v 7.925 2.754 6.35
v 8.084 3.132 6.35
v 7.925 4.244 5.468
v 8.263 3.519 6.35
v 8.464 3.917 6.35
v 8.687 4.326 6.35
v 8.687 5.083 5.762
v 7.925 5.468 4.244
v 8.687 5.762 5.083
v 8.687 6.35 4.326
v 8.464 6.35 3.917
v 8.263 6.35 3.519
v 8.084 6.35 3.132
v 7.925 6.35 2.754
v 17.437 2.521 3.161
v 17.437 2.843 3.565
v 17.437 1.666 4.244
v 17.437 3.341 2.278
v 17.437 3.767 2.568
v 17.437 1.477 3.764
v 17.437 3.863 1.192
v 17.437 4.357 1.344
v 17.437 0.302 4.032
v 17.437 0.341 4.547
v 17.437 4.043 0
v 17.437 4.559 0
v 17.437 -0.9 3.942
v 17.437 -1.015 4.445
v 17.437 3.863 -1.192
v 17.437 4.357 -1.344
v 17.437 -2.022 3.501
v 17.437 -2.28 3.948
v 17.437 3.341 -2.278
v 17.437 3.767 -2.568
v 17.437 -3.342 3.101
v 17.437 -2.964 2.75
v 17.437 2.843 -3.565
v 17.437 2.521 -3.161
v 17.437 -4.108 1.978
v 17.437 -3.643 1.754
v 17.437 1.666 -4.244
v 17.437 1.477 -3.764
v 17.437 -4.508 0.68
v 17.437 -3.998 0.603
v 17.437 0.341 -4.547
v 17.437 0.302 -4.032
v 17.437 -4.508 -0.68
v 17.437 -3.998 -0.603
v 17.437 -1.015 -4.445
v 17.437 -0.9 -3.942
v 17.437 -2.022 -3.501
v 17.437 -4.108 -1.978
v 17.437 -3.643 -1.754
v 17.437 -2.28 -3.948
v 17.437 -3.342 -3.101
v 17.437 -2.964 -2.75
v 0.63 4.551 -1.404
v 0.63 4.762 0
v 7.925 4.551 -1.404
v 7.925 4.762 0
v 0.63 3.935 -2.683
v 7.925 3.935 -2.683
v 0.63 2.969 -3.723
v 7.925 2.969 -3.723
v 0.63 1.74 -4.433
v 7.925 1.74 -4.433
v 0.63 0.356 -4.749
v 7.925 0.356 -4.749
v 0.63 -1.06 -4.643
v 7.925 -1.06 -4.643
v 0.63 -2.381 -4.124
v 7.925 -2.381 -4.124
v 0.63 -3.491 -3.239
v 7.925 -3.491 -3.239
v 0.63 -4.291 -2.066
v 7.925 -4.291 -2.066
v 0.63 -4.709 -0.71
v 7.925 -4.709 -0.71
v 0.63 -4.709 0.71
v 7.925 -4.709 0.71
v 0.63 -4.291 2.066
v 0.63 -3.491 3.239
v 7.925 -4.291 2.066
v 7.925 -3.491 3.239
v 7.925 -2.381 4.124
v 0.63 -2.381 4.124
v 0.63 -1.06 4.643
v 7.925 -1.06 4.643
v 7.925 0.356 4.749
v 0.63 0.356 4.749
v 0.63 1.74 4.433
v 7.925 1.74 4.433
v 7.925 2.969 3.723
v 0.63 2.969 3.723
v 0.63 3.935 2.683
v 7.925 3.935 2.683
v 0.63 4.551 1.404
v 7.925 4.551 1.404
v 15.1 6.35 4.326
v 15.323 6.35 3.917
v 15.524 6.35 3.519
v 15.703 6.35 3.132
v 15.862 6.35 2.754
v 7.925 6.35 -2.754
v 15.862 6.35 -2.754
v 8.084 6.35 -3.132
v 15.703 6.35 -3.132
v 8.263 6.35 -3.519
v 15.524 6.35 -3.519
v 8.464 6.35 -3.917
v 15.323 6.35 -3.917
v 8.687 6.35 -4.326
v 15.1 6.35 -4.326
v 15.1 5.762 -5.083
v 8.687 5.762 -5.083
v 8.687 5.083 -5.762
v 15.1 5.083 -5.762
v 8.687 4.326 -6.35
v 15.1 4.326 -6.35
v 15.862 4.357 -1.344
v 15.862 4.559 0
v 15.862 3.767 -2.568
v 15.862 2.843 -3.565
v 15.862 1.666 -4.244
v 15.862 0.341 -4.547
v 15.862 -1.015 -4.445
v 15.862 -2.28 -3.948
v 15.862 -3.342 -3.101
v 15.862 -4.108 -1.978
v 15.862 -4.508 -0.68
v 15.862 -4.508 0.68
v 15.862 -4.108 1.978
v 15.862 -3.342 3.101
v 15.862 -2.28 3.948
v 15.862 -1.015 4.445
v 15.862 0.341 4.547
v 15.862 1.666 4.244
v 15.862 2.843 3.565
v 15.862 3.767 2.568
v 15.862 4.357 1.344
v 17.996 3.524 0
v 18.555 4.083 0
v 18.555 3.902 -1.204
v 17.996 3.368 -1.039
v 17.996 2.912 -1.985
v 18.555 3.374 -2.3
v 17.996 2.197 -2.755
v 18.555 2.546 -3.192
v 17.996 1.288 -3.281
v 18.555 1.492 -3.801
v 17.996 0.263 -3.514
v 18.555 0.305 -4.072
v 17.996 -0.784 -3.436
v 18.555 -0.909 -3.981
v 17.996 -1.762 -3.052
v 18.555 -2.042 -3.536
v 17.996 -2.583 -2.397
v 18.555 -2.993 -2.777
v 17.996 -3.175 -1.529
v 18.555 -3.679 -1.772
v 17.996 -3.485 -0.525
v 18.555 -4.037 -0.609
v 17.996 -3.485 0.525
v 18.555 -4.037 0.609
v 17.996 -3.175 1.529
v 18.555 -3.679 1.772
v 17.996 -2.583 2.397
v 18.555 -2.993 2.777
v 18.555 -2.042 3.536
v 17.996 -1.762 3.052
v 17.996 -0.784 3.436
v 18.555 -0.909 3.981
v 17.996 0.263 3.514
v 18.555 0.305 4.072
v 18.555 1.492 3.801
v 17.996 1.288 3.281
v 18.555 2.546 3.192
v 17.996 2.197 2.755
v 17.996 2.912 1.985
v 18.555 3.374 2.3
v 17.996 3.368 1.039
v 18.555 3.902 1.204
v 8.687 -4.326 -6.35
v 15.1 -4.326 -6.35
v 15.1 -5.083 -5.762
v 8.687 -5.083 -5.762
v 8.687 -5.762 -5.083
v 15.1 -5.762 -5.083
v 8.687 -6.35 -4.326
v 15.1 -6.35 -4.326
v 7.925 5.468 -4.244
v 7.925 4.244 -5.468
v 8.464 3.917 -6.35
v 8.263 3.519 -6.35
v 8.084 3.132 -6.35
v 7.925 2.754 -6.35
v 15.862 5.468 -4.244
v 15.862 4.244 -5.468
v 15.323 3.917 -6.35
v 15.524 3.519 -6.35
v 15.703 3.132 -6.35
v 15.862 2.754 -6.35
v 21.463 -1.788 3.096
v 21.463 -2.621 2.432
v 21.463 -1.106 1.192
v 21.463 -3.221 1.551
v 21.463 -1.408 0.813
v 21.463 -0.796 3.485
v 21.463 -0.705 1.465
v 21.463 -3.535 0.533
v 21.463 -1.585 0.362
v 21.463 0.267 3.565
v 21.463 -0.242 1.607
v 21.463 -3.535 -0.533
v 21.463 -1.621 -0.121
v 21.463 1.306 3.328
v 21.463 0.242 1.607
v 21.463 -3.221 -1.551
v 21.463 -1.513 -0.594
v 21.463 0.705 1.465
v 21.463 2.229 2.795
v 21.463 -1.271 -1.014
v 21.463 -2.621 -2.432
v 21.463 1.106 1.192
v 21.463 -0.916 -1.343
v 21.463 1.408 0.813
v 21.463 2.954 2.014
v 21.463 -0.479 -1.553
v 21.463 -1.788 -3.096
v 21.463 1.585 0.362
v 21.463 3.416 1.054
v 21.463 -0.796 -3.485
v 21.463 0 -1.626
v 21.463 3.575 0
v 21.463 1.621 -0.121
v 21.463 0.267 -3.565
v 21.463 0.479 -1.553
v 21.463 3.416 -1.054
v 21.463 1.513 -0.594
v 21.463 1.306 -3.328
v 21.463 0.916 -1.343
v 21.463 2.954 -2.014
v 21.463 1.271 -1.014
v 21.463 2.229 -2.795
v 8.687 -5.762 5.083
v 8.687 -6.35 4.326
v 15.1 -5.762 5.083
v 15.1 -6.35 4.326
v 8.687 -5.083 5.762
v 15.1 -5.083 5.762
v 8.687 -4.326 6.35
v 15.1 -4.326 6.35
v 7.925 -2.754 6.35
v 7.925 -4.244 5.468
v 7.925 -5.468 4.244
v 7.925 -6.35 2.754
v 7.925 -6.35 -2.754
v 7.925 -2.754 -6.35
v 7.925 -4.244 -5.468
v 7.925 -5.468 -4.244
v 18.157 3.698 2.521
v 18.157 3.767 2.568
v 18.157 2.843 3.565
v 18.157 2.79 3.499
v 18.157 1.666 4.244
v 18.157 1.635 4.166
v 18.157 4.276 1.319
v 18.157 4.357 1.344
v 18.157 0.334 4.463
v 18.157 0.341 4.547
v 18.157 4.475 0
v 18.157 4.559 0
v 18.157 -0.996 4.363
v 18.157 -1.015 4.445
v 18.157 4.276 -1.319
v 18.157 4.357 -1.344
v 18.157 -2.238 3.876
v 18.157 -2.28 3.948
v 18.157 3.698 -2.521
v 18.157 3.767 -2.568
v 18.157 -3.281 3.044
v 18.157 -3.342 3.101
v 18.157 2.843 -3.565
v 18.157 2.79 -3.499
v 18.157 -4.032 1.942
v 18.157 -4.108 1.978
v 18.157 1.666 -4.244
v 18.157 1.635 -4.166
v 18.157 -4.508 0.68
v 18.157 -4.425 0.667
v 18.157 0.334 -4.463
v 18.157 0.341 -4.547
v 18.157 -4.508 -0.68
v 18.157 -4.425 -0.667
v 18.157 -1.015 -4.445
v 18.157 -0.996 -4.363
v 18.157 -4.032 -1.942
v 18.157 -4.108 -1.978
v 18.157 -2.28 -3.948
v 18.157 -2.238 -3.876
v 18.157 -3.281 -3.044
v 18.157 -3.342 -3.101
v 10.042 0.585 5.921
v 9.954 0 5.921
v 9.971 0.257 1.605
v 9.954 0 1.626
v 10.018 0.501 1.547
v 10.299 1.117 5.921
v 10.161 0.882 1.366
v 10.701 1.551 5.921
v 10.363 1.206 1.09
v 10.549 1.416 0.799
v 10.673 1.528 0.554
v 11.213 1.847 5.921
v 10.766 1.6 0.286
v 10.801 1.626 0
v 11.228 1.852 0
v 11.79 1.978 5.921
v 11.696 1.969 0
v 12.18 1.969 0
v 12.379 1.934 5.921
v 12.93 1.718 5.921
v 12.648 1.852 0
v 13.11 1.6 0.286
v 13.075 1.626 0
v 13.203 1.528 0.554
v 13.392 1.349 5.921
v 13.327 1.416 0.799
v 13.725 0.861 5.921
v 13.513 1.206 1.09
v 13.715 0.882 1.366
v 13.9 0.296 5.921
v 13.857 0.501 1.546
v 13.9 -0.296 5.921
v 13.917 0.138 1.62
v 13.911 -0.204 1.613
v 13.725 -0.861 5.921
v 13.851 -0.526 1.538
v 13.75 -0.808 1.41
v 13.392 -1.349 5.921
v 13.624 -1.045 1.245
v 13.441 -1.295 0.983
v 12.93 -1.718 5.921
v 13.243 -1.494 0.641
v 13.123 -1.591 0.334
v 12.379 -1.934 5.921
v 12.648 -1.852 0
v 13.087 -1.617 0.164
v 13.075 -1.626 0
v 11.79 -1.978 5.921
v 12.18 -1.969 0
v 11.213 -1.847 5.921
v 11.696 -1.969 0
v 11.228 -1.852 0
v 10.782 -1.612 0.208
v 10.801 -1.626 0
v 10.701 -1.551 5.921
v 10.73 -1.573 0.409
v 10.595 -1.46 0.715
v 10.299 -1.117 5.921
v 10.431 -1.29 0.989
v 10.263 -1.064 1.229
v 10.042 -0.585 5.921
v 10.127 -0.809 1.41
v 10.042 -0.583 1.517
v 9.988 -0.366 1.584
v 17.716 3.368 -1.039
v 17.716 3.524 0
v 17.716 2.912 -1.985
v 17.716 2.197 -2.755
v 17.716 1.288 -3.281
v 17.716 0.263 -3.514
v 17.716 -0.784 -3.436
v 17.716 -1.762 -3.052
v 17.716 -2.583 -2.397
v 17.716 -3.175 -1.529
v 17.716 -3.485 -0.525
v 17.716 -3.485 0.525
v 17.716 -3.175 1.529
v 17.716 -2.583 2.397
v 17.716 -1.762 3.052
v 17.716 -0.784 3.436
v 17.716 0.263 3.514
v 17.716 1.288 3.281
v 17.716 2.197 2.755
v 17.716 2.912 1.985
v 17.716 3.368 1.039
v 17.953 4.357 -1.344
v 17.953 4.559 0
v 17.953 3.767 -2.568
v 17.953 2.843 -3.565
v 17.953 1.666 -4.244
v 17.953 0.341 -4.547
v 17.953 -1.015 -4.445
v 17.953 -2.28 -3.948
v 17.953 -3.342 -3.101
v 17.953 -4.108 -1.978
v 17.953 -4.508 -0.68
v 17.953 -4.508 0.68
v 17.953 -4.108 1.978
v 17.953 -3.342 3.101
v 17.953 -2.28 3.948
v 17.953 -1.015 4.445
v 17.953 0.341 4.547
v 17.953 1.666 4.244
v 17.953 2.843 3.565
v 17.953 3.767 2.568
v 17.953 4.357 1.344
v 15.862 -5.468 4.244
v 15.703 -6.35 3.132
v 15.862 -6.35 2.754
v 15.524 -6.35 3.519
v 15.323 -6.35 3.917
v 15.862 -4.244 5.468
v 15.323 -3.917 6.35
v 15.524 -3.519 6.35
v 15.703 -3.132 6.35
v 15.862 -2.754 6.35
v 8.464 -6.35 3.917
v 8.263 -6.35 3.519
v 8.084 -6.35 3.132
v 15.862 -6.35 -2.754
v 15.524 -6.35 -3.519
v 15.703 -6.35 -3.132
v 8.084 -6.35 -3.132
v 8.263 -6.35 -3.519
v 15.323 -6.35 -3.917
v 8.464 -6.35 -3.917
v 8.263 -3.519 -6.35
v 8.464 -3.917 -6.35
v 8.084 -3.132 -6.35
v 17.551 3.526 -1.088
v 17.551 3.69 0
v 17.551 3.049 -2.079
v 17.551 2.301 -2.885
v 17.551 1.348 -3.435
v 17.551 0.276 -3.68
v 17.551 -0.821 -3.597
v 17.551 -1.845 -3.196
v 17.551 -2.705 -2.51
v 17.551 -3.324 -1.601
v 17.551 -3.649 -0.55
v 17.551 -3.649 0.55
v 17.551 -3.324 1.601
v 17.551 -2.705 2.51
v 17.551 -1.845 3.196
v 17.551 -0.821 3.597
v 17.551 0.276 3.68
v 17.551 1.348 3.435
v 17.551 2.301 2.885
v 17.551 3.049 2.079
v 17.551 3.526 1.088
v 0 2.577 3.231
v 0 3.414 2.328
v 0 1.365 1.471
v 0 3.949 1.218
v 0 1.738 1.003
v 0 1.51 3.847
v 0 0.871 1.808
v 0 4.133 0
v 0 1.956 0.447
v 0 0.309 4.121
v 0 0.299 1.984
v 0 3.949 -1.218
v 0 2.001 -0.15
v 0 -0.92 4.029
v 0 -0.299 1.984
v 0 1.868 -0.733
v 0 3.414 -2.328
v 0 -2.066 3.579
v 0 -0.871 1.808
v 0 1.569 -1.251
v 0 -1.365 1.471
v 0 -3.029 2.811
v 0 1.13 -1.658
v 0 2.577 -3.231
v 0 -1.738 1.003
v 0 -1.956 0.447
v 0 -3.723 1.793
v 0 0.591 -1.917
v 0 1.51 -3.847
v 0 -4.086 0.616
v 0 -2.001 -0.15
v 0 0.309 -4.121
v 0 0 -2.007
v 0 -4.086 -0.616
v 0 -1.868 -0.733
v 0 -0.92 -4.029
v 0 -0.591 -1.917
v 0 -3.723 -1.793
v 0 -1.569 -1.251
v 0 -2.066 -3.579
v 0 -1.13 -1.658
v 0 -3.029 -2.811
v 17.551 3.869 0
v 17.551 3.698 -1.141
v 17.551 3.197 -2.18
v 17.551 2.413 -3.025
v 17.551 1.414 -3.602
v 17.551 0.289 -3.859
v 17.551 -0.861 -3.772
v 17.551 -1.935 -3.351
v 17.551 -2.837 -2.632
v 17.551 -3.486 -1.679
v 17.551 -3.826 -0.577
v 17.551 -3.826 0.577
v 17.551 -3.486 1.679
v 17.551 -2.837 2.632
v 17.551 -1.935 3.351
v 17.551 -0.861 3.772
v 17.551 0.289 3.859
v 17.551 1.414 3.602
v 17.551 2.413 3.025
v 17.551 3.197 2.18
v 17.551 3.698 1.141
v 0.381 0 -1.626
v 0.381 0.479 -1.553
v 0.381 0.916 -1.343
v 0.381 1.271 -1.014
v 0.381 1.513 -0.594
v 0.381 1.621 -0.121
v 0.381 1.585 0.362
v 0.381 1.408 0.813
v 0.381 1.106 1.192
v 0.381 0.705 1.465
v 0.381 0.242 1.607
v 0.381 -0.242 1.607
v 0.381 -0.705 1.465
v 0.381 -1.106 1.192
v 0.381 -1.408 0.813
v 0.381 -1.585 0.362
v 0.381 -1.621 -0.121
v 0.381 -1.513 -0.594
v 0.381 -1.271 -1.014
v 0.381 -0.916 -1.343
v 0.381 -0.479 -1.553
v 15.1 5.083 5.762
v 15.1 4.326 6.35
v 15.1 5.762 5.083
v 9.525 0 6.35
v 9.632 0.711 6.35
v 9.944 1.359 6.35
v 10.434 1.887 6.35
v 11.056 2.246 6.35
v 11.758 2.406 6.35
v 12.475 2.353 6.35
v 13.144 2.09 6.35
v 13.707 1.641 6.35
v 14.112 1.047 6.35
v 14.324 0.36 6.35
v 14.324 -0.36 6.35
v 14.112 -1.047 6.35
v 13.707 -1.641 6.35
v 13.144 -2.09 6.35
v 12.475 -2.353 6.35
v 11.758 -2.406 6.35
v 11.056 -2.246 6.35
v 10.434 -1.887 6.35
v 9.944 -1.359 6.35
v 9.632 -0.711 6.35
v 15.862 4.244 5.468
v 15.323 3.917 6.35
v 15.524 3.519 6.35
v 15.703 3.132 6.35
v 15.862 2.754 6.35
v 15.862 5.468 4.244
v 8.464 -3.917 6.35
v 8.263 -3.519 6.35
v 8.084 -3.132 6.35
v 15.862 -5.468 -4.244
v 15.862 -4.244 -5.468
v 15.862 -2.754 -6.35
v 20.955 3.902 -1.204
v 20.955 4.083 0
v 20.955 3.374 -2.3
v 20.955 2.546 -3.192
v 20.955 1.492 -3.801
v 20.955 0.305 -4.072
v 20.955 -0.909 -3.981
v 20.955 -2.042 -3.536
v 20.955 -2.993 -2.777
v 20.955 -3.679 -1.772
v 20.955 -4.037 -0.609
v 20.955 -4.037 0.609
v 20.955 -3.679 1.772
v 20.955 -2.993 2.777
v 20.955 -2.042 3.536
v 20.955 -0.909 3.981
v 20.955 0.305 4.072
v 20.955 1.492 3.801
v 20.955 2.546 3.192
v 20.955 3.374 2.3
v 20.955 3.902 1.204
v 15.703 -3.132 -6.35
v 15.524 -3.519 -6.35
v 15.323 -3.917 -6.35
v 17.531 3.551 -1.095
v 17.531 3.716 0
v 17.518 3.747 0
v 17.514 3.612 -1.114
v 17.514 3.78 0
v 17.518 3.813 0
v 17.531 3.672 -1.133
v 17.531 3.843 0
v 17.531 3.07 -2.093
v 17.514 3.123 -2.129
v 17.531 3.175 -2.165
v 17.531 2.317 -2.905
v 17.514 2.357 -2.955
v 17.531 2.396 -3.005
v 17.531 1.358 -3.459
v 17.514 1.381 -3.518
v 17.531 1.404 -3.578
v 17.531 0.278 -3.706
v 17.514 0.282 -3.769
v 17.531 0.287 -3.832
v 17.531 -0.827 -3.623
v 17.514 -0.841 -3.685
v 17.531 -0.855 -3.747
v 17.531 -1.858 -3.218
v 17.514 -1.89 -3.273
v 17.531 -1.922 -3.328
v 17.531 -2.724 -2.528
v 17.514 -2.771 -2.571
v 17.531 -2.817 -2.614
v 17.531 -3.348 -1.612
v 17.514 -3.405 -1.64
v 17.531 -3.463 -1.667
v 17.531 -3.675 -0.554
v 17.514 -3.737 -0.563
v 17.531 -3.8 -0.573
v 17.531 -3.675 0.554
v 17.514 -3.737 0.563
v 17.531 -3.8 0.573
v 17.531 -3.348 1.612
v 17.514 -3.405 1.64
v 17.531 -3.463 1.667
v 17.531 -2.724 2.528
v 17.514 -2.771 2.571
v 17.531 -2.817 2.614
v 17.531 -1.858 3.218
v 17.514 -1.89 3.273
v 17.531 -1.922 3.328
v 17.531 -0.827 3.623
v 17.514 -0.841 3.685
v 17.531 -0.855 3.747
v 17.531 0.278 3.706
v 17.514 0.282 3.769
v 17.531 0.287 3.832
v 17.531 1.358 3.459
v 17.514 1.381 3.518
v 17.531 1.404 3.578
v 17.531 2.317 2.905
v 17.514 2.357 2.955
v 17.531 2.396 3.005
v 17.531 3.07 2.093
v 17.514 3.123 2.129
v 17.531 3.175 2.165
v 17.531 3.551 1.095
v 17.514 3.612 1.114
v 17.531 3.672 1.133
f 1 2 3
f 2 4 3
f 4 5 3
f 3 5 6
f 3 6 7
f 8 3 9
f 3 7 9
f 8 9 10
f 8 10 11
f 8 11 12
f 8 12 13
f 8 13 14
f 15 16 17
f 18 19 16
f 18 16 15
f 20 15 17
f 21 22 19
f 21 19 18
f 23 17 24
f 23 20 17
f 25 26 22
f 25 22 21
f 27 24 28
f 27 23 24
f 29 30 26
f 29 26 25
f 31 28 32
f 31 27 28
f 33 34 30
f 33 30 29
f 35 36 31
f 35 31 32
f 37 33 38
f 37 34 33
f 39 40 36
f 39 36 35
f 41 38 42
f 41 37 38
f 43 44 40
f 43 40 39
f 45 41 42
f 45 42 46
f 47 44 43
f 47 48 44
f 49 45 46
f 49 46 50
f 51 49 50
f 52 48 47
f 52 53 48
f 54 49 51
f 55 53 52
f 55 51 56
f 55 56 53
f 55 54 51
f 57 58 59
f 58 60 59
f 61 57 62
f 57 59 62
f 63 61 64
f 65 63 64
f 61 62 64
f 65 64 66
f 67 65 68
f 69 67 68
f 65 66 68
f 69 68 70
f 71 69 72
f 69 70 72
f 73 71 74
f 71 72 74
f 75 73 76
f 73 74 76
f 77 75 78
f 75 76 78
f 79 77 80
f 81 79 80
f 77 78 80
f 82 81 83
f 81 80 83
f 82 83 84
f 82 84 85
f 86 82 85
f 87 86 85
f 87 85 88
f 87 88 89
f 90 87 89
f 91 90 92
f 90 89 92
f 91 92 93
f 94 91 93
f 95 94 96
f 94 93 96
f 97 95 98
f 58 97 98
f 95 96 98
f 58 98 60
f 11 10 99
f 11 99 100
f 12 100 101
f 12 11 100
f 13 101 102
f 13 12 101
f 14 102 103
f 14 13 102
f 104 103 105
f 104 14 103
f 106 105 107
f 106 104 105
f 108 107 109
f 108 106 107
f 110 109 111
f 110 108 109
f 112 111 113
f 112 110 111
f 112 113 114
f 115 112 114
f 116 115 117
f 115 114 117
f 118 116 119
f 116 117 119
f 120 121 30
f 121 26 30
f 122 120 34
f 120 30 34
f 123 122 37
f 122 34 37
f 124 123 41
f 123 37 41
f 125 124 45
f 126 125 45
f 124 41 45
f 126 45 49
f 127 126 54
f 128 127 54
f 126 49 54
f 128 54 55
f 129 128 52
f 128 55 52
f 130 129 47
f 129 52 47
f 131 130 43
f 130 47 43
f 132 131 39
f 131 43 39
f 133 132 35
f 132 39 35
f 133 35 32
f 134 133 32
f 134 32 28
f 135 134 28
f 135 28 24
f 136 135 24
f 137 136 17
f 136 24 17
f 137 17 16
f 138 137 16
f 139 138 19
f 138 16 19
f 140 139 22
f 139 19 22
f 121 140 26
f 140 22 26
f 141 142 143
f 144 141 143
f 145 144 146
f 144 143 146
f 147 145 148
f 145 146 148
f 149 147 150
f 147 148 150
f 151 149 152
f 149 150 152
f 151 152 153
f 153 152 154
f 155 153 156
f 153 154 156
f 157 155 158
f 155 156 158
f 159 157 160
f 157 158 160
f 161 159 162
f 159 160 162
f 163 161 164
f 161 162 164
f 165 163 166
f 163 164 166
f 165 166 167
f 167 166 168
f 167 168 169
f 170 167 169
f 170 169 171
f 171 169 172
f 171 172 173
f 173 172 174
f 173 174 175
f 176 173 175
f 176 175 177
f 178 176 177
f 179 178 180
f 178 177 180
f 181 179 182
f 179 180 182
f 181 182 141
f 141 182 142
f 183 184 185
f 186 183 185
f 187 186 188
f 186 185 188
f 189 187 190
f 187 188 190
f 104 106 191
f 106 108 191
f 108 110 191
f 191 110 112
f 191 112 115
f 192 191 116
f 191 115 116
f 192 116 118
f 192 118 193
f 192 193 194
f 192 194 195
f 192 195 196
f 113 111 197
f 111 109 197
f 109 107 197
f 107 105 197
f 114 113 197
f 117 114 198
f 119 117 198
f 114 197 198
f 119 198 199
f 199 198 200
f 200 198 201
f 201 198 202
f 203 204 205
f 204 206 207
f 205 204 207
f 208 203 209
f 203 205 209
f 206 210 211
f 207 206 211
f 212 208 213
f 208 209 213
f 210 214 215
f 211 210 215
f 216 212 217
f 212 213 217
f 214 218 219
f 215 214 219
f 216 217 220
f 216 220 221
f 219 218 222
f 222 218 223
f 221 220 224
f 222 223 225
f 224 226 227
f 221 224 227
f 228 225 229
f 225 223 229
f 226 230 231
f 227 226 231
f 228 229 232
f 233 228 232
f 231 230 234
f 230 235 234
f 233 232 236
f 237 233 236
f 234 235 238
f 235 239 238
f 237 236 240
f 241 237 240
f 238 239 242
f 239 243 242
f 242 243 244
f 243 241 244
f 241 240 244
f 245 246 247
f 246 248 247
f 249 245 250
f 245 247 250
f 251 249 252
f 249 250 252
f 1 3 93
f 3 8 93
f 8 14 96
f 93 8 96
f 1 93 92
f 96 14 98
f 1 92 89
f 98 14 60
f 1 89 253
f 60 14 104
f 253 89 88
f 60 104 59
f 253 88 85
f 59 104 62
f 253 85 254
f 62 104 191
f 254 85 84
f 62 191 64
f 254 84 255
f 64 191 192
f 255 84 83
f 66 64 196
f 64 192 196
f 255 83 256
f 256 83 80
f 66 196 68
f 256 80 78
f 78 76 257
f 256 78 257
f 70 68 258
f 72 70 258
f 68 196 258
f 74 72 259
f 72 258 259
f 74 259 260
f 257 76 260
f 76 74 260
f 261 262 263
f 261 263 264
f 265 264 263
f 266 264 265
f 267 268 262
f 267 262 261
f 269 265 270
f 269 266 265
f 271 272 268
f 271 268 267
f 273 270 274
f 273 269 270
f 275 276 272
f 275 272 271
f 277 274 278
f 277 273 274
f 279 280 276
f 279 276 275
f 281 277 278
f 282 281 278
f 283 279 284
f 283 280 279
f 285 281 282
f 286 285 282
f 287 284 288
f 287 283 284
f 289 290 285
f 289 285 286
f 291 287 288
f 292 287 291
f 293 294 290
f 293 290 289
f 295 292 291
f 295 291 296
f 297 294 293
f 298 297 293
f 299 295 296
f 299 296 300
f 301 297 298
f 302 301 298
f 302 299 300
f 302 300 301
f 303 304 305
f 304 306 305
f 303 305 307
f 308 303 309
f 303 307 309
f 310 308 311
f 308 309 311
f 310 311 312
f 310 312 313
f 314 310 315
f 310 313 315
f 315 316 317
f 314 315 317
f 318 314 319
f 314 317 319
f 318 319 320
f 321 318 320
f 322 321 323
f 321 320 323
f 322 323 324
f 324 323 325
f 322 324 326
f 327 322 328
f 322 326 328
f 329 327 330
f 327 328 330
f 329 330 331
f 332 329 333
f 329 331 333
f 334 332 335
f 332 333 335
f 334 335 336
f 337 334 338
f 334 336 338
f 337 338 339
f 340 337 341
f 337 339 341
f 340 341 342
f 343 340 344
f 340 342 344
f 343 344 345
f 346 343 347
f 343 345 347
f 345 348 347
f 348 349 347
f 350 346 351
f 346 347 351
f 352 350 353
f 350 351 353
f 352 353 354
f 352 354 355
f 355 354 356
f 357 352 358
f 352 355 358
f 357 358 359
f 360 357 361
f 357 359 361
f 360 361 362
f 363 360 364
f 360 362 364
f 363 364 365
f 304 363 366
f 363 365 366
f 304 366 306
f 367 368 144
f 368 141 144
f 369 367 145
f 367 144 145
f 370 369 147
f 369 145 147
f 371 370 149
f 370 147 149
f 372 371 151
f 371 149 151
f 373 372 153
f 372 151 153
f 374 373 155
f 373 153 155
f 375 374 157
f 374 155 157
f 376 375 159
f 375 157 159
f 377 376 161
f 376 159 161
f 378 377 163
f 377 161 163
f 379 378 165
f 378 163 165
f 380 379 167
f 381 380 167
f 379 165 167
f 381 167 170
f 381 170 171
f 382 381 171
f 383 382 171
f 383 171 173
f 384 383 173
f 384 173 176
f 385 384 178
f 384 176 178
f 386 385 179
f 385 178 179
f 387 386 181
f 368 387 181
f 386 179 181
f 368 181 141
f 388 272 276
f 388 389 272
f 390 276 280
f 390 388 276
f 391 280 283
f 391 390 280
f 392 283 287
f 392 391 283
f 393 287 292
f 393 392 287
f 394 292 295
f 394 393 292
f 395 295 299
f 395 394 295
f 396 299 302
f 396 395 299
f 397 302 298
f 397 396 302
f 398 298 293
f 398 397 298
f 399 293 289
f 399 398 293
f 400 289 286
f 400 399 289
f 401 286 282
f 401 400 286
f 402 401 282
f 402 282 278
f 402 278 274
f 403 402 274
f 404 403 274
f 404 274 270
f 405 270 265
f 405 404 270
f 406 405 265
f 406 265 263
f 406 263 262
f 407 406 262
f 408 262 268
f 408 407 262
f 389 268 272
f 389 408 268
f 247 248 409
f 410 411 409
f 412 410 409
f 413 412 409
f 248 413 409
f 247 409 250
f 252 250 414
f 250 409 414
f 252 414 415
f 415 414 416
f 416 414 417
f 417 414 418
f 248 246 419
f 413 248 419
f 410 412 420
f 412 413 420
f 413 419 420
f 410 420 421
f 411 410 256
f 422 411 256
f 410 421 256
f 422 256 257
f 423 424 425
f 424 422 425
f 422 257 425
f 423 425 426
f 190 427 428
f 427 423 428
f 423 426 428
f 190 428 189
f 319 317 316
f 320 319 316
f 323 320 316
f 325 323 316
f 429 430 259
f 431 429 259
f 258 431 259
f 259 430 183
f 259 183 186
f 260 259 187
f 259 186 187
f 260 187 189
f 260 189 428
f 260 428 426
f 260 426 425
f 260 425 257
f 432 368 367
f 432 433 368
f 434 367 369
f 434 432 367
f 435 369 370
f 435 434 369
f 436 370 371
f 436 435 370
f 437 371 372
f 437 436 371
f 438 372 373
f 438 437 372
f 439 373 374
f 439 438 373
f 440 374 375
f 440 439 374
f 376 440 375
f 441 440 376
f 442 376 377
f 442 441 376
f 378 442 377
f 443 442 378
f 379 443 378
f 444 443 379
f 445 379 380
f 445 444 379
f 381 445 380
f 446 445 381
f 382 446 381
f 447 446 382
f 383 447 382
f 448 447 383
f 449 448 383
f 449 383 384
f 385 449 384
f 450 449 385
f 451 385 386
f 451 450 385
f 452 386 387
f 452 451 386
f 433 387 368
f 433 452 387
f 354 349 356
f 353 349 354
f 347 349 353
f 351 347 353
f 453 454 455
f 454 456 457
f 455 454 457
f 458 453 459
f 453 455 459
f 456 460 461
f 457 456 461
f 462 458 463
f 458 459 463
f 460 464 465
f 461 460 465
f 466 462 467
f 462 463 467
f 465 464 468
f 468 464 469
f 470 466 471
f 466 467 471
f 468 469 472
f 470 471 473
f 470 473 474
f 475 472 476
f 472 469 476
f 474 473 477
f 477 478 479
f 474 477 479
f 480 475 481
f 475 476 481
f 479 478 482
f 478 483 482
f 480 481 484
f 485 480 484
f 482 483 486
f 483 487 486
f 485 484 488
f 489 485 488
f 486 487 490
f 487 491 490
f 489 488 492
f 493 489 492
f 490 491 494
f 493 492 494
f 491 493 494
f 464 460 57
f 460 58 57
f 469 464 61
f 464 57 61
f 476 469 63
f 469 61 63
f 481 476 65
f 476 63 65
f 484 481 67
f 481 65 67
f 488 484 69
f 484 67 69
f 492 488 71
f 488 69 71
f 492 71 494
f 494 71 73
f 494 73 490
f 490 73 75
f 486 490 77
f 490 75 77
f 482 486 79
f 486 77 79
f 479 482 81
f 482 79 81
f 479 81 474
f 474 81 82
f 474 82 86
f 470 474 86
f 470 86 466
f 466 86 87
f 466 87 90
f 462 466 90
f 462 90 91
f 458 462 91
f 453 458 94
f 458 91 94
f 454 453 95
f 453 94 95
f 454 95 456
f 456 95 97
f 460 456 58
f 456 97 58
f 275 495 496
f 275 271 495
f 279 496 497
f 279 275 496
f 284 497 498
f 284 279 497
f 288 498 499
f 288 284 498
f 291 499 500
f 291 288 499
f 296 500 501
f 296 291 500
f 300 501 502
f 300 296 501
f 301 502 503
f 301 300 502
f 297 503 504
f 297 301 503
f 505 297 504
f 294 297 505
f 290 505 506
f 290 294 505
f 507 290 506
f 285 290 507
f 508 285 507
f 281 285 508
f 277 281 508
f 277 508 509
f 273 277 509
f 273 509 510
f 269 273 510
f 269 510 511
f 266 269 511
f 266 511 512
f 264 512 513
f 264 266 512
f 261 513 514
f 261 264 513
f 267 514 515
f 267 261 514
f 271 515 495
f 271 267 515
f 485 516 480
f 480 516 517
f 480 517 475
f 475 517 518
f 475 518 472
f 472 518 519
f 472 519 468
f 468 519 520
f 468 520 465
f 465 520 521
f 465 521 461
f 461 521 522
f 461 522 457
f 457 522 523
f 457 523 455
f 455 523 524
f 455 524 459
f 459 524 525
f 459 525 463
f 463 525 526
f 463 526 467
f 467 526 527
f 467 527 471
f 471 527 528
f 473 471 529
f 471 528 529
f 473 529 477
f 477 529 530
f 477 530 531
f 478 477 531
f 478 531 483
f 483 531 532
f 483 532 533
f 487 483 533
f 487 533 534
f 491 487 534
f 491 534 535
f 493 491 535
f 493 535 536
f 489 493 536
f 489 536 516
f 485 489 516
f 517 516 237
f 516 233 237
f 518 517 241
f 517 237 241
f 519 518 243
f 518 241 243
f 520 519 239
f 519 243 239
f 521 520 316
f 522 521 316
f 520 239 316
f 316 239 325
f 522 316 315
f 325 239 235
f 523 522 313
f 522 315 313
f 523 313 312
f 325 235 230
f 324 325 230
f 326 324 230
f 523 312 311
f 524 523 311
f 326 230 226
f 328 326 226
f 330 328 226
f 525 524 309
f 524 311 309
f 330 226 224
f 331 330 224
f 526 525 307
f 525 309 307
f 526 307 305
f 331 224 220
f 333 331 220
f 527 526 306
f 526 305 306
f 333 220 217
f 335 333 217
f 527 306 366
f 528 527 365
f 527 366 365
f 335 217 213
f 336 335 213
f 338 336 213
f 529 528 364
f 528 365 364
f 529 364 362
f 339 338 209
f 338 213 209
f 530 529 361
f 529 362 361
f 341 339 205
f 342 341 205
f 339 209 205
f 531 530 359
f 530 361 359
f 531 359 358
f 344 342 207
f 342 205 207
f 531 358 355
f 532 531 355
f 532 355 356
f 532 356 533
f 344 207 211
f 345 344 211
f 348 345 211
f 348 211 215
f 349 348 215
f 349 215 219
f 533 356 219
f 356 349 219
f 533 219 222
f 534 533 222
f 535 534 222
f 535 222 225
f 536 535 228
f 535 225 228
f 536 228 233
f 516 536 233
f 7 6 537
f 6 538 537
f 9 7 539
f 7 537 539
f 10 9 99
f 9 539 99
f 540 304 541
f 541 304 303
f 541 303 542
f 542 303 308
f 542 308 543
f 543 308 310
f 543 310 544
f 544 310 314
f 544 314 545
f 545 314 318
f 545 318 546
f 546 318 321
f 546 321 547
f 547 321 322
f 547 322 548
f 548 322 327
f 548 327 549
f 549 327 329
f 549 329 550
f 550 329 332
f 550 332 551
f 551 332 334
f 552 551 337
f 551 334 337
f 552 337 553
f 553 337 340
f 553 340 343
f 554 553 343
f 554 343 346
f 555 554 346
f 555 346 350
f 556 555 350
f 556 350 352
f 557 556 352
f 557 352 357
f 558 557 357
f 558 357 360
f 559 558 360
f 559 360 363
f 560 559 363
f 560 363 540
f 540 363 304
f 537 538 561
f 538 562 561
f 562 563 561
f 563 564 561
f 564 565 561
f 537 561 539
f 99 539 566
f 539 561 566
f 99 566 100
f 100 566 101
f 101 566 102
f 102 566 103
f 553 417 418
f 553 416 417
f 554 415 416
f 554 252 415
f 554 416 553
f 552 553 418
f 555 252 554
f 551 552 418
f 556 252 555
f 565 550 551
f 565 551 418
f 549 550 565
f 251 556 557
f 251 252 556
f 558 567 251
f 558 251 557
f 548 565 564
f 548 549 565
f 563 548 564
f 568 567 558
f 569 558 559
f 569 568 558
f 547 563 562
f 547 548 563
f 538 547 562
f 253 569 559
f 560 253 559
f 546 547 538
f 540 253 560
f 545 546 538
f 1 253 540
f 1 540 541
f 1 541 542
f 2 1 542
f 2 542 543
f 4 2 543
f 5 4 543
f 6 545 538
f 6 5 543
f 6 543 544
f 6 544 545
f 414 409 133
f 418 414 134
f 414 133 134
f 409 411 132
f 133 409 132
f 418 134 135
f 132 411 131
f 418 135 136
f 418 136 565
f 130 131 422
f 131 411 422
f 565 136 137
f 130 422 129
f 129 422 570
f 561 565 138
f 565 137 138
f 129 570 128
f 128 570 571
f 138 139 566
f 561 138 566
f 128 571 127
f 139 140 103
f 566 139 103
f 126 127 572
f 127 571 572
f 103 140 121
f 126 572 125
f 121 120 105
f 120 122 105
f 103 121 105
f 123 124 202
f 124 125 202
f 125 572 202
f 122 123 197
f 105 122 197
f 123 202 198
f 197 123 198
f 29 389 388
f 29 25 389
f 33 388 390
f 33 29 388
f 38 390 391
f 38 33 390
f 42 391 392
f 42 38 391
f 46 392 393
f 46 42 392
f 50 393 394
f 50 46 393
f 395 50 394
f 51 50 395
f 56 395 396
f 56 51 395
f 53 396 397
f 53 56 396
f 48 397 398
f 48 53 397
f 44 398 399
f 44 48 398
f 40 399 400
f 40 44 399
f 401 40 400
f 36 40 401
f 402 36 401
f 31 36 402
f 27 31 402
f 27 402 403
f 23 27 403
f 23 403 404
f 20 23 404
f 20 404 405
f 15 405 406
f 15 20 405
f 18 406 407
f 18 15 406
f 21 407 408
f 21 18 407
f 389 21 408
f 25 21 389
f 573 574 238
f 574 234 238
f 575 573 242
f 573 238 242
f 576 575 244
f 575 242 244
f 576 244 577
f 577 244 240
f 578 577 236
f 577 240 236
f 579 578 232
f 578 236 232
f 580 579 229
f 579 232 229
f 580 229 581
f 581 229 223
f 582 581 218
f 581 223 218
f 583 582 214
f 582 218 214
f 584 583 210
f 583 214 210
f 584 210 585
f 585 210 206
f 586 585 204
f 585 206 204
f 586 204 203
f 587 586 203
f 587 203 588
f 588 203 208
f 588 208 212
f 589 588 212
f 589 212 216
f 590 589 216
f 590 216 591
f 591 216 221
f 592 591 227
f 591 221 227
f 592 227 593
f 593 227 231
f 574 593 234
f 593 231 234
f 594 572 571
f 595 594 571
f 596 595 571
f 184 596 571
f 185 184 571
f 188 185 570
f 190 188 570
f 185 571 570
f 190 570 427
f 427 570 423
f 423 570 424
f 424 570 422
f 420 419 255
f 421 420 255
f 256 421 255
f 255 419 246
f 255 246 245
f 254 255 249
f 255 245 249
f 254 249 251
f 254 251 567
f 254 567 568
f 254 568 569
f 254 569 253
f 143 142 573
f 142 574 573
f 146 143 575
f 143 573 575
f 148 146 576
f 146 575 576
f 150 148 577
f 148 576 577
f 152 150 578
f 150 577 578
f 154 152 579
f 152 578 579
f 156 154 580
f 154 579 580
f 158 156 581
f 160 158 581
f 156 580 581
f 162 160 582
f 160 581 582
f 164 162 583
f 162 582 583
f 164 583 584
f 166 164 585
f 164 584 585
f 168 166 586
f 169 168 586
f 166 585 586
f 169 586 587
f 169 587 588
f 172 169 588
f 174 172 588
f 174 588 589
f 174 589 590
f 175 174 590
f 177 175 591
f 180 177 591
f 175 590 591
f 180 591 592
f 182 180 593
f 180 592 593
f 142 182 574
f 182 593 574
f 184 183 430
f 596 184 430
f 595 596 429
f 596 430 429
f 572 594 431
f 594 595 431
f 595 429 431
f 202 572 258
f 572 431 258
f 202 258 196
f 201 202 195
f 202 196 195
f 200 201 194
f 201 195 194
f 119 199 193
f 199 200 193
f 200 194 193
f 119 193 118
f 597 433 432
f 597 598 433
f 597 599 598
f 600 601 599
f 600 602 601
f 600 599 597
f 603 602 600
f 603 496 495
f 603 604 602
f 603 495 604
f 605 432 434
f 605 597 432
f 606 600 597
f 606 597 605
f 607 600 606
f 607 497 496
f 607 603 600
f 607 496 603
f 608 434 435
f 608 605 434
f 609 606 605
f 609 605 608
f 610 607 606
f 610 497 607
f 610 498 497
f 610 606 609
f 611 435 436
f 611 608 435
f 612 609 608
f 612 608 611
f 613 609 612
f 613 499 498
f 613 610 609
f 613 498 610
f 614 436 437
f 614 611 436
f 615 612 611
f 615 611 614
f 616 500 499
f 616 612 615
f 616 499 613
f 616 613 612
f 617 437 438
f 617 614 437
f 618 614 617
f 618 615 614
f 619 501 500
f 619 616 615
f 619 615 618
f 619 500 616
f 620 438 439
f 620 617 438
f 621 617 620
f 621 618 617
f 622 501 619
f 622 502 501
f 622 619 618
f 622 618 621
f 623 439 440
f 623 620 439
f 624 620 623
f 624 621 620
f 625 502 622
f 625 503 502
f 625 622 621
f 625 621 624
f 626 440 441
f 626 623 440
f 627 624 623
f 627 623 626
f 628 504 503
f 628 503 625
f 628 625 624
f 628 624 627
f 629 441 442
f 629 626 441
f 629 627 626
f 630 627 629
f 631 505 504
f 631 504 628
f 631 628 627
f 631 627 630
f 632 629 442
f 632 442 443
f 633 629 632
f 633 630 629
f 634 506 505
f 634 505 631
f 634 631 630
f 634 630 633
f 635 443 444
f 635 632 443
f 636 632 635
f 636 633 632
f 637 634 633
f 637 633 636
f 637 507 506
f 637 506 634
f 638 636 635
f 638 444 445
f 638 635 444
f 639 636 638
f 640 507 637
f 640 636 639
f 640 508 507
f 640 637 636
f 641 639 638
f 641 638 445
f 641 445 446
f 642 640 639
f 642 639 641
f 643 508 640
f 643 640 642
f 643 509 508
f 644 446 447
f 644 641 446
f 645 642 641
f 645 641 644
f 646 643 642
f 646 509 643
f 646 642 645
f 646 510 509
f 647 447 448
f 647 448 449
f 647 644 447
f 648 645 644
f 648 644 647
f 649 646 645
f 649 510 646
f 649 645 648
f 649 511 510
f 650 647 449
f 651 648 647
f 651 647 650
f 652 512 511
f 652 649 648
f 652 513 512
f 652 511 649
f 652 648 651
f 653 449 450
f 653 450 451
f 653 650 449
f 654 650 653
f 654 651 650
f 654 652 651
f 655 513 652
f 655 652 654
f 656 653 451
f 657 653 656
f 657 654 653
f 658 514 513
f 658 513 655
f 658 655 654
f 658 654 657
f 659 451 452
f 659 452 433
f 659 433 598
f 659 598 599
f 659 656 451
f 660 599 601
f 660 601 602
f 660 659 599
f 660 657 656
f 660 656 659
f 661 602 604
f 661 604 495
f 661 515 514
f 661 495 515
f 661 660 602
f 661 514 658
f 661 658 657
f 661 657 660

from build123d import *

# Parameters (mm, degrees)
SKETCH3_W          = 1.5748
SKETCH3_H          = 4.5593
HOLE1_D            = 3.2512
HOLE1_DEPTH        = 21.463
HOLE1_CSINK_D      = 4.0132
HOLE1_CSINK_ANGLE  = 90
SKETCH6_W          = 25.4
SKETCH6_H          = 25.4
SKETCH6_W_2        = 12.7
SKETCH6_H_2        = 12.7
CUT_EXTRUDE1_DEPTH = 21.463
HOLE2_D            = 3.96748
HOLE2_DEPTH        = 6.35
HOLE2_CSINK_D      = 4.826
HOLE2_CSINK_ANGLE  = 90


with BuildPart() as part:
    # Sketch1 → Revolve1 (revolve)
    with BuildSketch(Plane.XY):
        Polygon((0, 0), (0, 4.13258), (0.62992, 4.7625), (7.9248, 4.7625), (7.9248, 0), align=None)
    revolve(axis=Axis((7.9248, 0, 0), (-1, 0, 0)))

    # Sketch2 → Revolve2 (revolve)
    with BuildSketch(Plane.XY):
        Polygon((7.9248, 0), (7.9248, 6.9215), (8.6868, 7.6835), (15.1003, 7.6835), (15.8623, 6.9215), (15.8623, 3.52425), (17.9959, 3.52425), (18.5547, 4.08305), (20.955, 4.08305), (21.463, 3.57505), (21.463, 0), align=None)
    revolve(axis=Axis((21.463, 0, 0), (-1, 0, 0)))

    # Sketch3 → Revolve3 (revolve)
    with BuildSketch(Plane.XY):
        with Locations((16.6497, 2.27965)):
            Rectangle(SKETCH3_W, SKETCH3_H)
    revolve(axis=Axis((17.4371, 0, 0), (-1, 0, 0)))

    # Hole1
    with Locations(Plane.ZY):
        with Locations((0, 0)):
            CounterSinkHole(HOLE1_D / 2, HOLE1_CSINK_D / 2, depth=HOLE1_DEPTH, counter_sink_angle=HOLE1_CSINK_ANGLE)

    # Sketch6 → Cut-Extrude1 (cut)
    with BuildSketch(Plane(origin=(0, 0, 0), x_dir=(0, 0, -1), z_dir=(1, 0, 0))):
        Rectangle(SKETCH6_W, SKETCH6_H)
        Rectangle(SKETCH6_W_2, SKETCH6_H_2, mode=Mode.SUBTRACT)
    extrude(amount=CUT_EXTRUDE1_DEPTH, mode=Mode.SUBTRACT)

    # Hole2
    with Locations(Plane.XY.offset(6.35)):
        with Locations((11.938, 0)):
            CounterSinkHole(HOLE2_D / 2, HOLE2_CSINK_D / 2, depth=HOLE2_DEPTH, counter_sink_angle=HOLE2_CSINK_ANGLE)

    # Sketch9 → Revolve4 (revolve)
    with BuildSketch(Plane.XY):
        with BuildLine():
            Line((17.4371, 3.27025), (17.9959, 3.27025))
            Line((17.9959, 3.27025), (17.9959, 3.52425))
            Line((17.9959, 3.52425), (17.7165, 3.52425))
            Line((17.7165, 3.52425), (17.550871292, 3.689878708))
            ThreePointArc((17.550871292, 3.689878708), (17.513673853, 3.779681269), (17.550871292, 3.869483831))
            Line((17.550871292, 3.869483831), (18.156519265, 4.475131804))
            Line((18.156519265, 4.475131804), (18.156519265, 4.5593))
            Line((18.156519265, 4.5593), (17.953319265, 4.5593))
            Line((17.953319265, 4.5593), (17.4371, 4.043080735))
            Line((17.4371, 4.043080735), (17.4371, 3.27025))
        make_face()
    revolve(axis=Axis((17.9959, 0, 0), (-1, 0, 0)))


solid = part.part
